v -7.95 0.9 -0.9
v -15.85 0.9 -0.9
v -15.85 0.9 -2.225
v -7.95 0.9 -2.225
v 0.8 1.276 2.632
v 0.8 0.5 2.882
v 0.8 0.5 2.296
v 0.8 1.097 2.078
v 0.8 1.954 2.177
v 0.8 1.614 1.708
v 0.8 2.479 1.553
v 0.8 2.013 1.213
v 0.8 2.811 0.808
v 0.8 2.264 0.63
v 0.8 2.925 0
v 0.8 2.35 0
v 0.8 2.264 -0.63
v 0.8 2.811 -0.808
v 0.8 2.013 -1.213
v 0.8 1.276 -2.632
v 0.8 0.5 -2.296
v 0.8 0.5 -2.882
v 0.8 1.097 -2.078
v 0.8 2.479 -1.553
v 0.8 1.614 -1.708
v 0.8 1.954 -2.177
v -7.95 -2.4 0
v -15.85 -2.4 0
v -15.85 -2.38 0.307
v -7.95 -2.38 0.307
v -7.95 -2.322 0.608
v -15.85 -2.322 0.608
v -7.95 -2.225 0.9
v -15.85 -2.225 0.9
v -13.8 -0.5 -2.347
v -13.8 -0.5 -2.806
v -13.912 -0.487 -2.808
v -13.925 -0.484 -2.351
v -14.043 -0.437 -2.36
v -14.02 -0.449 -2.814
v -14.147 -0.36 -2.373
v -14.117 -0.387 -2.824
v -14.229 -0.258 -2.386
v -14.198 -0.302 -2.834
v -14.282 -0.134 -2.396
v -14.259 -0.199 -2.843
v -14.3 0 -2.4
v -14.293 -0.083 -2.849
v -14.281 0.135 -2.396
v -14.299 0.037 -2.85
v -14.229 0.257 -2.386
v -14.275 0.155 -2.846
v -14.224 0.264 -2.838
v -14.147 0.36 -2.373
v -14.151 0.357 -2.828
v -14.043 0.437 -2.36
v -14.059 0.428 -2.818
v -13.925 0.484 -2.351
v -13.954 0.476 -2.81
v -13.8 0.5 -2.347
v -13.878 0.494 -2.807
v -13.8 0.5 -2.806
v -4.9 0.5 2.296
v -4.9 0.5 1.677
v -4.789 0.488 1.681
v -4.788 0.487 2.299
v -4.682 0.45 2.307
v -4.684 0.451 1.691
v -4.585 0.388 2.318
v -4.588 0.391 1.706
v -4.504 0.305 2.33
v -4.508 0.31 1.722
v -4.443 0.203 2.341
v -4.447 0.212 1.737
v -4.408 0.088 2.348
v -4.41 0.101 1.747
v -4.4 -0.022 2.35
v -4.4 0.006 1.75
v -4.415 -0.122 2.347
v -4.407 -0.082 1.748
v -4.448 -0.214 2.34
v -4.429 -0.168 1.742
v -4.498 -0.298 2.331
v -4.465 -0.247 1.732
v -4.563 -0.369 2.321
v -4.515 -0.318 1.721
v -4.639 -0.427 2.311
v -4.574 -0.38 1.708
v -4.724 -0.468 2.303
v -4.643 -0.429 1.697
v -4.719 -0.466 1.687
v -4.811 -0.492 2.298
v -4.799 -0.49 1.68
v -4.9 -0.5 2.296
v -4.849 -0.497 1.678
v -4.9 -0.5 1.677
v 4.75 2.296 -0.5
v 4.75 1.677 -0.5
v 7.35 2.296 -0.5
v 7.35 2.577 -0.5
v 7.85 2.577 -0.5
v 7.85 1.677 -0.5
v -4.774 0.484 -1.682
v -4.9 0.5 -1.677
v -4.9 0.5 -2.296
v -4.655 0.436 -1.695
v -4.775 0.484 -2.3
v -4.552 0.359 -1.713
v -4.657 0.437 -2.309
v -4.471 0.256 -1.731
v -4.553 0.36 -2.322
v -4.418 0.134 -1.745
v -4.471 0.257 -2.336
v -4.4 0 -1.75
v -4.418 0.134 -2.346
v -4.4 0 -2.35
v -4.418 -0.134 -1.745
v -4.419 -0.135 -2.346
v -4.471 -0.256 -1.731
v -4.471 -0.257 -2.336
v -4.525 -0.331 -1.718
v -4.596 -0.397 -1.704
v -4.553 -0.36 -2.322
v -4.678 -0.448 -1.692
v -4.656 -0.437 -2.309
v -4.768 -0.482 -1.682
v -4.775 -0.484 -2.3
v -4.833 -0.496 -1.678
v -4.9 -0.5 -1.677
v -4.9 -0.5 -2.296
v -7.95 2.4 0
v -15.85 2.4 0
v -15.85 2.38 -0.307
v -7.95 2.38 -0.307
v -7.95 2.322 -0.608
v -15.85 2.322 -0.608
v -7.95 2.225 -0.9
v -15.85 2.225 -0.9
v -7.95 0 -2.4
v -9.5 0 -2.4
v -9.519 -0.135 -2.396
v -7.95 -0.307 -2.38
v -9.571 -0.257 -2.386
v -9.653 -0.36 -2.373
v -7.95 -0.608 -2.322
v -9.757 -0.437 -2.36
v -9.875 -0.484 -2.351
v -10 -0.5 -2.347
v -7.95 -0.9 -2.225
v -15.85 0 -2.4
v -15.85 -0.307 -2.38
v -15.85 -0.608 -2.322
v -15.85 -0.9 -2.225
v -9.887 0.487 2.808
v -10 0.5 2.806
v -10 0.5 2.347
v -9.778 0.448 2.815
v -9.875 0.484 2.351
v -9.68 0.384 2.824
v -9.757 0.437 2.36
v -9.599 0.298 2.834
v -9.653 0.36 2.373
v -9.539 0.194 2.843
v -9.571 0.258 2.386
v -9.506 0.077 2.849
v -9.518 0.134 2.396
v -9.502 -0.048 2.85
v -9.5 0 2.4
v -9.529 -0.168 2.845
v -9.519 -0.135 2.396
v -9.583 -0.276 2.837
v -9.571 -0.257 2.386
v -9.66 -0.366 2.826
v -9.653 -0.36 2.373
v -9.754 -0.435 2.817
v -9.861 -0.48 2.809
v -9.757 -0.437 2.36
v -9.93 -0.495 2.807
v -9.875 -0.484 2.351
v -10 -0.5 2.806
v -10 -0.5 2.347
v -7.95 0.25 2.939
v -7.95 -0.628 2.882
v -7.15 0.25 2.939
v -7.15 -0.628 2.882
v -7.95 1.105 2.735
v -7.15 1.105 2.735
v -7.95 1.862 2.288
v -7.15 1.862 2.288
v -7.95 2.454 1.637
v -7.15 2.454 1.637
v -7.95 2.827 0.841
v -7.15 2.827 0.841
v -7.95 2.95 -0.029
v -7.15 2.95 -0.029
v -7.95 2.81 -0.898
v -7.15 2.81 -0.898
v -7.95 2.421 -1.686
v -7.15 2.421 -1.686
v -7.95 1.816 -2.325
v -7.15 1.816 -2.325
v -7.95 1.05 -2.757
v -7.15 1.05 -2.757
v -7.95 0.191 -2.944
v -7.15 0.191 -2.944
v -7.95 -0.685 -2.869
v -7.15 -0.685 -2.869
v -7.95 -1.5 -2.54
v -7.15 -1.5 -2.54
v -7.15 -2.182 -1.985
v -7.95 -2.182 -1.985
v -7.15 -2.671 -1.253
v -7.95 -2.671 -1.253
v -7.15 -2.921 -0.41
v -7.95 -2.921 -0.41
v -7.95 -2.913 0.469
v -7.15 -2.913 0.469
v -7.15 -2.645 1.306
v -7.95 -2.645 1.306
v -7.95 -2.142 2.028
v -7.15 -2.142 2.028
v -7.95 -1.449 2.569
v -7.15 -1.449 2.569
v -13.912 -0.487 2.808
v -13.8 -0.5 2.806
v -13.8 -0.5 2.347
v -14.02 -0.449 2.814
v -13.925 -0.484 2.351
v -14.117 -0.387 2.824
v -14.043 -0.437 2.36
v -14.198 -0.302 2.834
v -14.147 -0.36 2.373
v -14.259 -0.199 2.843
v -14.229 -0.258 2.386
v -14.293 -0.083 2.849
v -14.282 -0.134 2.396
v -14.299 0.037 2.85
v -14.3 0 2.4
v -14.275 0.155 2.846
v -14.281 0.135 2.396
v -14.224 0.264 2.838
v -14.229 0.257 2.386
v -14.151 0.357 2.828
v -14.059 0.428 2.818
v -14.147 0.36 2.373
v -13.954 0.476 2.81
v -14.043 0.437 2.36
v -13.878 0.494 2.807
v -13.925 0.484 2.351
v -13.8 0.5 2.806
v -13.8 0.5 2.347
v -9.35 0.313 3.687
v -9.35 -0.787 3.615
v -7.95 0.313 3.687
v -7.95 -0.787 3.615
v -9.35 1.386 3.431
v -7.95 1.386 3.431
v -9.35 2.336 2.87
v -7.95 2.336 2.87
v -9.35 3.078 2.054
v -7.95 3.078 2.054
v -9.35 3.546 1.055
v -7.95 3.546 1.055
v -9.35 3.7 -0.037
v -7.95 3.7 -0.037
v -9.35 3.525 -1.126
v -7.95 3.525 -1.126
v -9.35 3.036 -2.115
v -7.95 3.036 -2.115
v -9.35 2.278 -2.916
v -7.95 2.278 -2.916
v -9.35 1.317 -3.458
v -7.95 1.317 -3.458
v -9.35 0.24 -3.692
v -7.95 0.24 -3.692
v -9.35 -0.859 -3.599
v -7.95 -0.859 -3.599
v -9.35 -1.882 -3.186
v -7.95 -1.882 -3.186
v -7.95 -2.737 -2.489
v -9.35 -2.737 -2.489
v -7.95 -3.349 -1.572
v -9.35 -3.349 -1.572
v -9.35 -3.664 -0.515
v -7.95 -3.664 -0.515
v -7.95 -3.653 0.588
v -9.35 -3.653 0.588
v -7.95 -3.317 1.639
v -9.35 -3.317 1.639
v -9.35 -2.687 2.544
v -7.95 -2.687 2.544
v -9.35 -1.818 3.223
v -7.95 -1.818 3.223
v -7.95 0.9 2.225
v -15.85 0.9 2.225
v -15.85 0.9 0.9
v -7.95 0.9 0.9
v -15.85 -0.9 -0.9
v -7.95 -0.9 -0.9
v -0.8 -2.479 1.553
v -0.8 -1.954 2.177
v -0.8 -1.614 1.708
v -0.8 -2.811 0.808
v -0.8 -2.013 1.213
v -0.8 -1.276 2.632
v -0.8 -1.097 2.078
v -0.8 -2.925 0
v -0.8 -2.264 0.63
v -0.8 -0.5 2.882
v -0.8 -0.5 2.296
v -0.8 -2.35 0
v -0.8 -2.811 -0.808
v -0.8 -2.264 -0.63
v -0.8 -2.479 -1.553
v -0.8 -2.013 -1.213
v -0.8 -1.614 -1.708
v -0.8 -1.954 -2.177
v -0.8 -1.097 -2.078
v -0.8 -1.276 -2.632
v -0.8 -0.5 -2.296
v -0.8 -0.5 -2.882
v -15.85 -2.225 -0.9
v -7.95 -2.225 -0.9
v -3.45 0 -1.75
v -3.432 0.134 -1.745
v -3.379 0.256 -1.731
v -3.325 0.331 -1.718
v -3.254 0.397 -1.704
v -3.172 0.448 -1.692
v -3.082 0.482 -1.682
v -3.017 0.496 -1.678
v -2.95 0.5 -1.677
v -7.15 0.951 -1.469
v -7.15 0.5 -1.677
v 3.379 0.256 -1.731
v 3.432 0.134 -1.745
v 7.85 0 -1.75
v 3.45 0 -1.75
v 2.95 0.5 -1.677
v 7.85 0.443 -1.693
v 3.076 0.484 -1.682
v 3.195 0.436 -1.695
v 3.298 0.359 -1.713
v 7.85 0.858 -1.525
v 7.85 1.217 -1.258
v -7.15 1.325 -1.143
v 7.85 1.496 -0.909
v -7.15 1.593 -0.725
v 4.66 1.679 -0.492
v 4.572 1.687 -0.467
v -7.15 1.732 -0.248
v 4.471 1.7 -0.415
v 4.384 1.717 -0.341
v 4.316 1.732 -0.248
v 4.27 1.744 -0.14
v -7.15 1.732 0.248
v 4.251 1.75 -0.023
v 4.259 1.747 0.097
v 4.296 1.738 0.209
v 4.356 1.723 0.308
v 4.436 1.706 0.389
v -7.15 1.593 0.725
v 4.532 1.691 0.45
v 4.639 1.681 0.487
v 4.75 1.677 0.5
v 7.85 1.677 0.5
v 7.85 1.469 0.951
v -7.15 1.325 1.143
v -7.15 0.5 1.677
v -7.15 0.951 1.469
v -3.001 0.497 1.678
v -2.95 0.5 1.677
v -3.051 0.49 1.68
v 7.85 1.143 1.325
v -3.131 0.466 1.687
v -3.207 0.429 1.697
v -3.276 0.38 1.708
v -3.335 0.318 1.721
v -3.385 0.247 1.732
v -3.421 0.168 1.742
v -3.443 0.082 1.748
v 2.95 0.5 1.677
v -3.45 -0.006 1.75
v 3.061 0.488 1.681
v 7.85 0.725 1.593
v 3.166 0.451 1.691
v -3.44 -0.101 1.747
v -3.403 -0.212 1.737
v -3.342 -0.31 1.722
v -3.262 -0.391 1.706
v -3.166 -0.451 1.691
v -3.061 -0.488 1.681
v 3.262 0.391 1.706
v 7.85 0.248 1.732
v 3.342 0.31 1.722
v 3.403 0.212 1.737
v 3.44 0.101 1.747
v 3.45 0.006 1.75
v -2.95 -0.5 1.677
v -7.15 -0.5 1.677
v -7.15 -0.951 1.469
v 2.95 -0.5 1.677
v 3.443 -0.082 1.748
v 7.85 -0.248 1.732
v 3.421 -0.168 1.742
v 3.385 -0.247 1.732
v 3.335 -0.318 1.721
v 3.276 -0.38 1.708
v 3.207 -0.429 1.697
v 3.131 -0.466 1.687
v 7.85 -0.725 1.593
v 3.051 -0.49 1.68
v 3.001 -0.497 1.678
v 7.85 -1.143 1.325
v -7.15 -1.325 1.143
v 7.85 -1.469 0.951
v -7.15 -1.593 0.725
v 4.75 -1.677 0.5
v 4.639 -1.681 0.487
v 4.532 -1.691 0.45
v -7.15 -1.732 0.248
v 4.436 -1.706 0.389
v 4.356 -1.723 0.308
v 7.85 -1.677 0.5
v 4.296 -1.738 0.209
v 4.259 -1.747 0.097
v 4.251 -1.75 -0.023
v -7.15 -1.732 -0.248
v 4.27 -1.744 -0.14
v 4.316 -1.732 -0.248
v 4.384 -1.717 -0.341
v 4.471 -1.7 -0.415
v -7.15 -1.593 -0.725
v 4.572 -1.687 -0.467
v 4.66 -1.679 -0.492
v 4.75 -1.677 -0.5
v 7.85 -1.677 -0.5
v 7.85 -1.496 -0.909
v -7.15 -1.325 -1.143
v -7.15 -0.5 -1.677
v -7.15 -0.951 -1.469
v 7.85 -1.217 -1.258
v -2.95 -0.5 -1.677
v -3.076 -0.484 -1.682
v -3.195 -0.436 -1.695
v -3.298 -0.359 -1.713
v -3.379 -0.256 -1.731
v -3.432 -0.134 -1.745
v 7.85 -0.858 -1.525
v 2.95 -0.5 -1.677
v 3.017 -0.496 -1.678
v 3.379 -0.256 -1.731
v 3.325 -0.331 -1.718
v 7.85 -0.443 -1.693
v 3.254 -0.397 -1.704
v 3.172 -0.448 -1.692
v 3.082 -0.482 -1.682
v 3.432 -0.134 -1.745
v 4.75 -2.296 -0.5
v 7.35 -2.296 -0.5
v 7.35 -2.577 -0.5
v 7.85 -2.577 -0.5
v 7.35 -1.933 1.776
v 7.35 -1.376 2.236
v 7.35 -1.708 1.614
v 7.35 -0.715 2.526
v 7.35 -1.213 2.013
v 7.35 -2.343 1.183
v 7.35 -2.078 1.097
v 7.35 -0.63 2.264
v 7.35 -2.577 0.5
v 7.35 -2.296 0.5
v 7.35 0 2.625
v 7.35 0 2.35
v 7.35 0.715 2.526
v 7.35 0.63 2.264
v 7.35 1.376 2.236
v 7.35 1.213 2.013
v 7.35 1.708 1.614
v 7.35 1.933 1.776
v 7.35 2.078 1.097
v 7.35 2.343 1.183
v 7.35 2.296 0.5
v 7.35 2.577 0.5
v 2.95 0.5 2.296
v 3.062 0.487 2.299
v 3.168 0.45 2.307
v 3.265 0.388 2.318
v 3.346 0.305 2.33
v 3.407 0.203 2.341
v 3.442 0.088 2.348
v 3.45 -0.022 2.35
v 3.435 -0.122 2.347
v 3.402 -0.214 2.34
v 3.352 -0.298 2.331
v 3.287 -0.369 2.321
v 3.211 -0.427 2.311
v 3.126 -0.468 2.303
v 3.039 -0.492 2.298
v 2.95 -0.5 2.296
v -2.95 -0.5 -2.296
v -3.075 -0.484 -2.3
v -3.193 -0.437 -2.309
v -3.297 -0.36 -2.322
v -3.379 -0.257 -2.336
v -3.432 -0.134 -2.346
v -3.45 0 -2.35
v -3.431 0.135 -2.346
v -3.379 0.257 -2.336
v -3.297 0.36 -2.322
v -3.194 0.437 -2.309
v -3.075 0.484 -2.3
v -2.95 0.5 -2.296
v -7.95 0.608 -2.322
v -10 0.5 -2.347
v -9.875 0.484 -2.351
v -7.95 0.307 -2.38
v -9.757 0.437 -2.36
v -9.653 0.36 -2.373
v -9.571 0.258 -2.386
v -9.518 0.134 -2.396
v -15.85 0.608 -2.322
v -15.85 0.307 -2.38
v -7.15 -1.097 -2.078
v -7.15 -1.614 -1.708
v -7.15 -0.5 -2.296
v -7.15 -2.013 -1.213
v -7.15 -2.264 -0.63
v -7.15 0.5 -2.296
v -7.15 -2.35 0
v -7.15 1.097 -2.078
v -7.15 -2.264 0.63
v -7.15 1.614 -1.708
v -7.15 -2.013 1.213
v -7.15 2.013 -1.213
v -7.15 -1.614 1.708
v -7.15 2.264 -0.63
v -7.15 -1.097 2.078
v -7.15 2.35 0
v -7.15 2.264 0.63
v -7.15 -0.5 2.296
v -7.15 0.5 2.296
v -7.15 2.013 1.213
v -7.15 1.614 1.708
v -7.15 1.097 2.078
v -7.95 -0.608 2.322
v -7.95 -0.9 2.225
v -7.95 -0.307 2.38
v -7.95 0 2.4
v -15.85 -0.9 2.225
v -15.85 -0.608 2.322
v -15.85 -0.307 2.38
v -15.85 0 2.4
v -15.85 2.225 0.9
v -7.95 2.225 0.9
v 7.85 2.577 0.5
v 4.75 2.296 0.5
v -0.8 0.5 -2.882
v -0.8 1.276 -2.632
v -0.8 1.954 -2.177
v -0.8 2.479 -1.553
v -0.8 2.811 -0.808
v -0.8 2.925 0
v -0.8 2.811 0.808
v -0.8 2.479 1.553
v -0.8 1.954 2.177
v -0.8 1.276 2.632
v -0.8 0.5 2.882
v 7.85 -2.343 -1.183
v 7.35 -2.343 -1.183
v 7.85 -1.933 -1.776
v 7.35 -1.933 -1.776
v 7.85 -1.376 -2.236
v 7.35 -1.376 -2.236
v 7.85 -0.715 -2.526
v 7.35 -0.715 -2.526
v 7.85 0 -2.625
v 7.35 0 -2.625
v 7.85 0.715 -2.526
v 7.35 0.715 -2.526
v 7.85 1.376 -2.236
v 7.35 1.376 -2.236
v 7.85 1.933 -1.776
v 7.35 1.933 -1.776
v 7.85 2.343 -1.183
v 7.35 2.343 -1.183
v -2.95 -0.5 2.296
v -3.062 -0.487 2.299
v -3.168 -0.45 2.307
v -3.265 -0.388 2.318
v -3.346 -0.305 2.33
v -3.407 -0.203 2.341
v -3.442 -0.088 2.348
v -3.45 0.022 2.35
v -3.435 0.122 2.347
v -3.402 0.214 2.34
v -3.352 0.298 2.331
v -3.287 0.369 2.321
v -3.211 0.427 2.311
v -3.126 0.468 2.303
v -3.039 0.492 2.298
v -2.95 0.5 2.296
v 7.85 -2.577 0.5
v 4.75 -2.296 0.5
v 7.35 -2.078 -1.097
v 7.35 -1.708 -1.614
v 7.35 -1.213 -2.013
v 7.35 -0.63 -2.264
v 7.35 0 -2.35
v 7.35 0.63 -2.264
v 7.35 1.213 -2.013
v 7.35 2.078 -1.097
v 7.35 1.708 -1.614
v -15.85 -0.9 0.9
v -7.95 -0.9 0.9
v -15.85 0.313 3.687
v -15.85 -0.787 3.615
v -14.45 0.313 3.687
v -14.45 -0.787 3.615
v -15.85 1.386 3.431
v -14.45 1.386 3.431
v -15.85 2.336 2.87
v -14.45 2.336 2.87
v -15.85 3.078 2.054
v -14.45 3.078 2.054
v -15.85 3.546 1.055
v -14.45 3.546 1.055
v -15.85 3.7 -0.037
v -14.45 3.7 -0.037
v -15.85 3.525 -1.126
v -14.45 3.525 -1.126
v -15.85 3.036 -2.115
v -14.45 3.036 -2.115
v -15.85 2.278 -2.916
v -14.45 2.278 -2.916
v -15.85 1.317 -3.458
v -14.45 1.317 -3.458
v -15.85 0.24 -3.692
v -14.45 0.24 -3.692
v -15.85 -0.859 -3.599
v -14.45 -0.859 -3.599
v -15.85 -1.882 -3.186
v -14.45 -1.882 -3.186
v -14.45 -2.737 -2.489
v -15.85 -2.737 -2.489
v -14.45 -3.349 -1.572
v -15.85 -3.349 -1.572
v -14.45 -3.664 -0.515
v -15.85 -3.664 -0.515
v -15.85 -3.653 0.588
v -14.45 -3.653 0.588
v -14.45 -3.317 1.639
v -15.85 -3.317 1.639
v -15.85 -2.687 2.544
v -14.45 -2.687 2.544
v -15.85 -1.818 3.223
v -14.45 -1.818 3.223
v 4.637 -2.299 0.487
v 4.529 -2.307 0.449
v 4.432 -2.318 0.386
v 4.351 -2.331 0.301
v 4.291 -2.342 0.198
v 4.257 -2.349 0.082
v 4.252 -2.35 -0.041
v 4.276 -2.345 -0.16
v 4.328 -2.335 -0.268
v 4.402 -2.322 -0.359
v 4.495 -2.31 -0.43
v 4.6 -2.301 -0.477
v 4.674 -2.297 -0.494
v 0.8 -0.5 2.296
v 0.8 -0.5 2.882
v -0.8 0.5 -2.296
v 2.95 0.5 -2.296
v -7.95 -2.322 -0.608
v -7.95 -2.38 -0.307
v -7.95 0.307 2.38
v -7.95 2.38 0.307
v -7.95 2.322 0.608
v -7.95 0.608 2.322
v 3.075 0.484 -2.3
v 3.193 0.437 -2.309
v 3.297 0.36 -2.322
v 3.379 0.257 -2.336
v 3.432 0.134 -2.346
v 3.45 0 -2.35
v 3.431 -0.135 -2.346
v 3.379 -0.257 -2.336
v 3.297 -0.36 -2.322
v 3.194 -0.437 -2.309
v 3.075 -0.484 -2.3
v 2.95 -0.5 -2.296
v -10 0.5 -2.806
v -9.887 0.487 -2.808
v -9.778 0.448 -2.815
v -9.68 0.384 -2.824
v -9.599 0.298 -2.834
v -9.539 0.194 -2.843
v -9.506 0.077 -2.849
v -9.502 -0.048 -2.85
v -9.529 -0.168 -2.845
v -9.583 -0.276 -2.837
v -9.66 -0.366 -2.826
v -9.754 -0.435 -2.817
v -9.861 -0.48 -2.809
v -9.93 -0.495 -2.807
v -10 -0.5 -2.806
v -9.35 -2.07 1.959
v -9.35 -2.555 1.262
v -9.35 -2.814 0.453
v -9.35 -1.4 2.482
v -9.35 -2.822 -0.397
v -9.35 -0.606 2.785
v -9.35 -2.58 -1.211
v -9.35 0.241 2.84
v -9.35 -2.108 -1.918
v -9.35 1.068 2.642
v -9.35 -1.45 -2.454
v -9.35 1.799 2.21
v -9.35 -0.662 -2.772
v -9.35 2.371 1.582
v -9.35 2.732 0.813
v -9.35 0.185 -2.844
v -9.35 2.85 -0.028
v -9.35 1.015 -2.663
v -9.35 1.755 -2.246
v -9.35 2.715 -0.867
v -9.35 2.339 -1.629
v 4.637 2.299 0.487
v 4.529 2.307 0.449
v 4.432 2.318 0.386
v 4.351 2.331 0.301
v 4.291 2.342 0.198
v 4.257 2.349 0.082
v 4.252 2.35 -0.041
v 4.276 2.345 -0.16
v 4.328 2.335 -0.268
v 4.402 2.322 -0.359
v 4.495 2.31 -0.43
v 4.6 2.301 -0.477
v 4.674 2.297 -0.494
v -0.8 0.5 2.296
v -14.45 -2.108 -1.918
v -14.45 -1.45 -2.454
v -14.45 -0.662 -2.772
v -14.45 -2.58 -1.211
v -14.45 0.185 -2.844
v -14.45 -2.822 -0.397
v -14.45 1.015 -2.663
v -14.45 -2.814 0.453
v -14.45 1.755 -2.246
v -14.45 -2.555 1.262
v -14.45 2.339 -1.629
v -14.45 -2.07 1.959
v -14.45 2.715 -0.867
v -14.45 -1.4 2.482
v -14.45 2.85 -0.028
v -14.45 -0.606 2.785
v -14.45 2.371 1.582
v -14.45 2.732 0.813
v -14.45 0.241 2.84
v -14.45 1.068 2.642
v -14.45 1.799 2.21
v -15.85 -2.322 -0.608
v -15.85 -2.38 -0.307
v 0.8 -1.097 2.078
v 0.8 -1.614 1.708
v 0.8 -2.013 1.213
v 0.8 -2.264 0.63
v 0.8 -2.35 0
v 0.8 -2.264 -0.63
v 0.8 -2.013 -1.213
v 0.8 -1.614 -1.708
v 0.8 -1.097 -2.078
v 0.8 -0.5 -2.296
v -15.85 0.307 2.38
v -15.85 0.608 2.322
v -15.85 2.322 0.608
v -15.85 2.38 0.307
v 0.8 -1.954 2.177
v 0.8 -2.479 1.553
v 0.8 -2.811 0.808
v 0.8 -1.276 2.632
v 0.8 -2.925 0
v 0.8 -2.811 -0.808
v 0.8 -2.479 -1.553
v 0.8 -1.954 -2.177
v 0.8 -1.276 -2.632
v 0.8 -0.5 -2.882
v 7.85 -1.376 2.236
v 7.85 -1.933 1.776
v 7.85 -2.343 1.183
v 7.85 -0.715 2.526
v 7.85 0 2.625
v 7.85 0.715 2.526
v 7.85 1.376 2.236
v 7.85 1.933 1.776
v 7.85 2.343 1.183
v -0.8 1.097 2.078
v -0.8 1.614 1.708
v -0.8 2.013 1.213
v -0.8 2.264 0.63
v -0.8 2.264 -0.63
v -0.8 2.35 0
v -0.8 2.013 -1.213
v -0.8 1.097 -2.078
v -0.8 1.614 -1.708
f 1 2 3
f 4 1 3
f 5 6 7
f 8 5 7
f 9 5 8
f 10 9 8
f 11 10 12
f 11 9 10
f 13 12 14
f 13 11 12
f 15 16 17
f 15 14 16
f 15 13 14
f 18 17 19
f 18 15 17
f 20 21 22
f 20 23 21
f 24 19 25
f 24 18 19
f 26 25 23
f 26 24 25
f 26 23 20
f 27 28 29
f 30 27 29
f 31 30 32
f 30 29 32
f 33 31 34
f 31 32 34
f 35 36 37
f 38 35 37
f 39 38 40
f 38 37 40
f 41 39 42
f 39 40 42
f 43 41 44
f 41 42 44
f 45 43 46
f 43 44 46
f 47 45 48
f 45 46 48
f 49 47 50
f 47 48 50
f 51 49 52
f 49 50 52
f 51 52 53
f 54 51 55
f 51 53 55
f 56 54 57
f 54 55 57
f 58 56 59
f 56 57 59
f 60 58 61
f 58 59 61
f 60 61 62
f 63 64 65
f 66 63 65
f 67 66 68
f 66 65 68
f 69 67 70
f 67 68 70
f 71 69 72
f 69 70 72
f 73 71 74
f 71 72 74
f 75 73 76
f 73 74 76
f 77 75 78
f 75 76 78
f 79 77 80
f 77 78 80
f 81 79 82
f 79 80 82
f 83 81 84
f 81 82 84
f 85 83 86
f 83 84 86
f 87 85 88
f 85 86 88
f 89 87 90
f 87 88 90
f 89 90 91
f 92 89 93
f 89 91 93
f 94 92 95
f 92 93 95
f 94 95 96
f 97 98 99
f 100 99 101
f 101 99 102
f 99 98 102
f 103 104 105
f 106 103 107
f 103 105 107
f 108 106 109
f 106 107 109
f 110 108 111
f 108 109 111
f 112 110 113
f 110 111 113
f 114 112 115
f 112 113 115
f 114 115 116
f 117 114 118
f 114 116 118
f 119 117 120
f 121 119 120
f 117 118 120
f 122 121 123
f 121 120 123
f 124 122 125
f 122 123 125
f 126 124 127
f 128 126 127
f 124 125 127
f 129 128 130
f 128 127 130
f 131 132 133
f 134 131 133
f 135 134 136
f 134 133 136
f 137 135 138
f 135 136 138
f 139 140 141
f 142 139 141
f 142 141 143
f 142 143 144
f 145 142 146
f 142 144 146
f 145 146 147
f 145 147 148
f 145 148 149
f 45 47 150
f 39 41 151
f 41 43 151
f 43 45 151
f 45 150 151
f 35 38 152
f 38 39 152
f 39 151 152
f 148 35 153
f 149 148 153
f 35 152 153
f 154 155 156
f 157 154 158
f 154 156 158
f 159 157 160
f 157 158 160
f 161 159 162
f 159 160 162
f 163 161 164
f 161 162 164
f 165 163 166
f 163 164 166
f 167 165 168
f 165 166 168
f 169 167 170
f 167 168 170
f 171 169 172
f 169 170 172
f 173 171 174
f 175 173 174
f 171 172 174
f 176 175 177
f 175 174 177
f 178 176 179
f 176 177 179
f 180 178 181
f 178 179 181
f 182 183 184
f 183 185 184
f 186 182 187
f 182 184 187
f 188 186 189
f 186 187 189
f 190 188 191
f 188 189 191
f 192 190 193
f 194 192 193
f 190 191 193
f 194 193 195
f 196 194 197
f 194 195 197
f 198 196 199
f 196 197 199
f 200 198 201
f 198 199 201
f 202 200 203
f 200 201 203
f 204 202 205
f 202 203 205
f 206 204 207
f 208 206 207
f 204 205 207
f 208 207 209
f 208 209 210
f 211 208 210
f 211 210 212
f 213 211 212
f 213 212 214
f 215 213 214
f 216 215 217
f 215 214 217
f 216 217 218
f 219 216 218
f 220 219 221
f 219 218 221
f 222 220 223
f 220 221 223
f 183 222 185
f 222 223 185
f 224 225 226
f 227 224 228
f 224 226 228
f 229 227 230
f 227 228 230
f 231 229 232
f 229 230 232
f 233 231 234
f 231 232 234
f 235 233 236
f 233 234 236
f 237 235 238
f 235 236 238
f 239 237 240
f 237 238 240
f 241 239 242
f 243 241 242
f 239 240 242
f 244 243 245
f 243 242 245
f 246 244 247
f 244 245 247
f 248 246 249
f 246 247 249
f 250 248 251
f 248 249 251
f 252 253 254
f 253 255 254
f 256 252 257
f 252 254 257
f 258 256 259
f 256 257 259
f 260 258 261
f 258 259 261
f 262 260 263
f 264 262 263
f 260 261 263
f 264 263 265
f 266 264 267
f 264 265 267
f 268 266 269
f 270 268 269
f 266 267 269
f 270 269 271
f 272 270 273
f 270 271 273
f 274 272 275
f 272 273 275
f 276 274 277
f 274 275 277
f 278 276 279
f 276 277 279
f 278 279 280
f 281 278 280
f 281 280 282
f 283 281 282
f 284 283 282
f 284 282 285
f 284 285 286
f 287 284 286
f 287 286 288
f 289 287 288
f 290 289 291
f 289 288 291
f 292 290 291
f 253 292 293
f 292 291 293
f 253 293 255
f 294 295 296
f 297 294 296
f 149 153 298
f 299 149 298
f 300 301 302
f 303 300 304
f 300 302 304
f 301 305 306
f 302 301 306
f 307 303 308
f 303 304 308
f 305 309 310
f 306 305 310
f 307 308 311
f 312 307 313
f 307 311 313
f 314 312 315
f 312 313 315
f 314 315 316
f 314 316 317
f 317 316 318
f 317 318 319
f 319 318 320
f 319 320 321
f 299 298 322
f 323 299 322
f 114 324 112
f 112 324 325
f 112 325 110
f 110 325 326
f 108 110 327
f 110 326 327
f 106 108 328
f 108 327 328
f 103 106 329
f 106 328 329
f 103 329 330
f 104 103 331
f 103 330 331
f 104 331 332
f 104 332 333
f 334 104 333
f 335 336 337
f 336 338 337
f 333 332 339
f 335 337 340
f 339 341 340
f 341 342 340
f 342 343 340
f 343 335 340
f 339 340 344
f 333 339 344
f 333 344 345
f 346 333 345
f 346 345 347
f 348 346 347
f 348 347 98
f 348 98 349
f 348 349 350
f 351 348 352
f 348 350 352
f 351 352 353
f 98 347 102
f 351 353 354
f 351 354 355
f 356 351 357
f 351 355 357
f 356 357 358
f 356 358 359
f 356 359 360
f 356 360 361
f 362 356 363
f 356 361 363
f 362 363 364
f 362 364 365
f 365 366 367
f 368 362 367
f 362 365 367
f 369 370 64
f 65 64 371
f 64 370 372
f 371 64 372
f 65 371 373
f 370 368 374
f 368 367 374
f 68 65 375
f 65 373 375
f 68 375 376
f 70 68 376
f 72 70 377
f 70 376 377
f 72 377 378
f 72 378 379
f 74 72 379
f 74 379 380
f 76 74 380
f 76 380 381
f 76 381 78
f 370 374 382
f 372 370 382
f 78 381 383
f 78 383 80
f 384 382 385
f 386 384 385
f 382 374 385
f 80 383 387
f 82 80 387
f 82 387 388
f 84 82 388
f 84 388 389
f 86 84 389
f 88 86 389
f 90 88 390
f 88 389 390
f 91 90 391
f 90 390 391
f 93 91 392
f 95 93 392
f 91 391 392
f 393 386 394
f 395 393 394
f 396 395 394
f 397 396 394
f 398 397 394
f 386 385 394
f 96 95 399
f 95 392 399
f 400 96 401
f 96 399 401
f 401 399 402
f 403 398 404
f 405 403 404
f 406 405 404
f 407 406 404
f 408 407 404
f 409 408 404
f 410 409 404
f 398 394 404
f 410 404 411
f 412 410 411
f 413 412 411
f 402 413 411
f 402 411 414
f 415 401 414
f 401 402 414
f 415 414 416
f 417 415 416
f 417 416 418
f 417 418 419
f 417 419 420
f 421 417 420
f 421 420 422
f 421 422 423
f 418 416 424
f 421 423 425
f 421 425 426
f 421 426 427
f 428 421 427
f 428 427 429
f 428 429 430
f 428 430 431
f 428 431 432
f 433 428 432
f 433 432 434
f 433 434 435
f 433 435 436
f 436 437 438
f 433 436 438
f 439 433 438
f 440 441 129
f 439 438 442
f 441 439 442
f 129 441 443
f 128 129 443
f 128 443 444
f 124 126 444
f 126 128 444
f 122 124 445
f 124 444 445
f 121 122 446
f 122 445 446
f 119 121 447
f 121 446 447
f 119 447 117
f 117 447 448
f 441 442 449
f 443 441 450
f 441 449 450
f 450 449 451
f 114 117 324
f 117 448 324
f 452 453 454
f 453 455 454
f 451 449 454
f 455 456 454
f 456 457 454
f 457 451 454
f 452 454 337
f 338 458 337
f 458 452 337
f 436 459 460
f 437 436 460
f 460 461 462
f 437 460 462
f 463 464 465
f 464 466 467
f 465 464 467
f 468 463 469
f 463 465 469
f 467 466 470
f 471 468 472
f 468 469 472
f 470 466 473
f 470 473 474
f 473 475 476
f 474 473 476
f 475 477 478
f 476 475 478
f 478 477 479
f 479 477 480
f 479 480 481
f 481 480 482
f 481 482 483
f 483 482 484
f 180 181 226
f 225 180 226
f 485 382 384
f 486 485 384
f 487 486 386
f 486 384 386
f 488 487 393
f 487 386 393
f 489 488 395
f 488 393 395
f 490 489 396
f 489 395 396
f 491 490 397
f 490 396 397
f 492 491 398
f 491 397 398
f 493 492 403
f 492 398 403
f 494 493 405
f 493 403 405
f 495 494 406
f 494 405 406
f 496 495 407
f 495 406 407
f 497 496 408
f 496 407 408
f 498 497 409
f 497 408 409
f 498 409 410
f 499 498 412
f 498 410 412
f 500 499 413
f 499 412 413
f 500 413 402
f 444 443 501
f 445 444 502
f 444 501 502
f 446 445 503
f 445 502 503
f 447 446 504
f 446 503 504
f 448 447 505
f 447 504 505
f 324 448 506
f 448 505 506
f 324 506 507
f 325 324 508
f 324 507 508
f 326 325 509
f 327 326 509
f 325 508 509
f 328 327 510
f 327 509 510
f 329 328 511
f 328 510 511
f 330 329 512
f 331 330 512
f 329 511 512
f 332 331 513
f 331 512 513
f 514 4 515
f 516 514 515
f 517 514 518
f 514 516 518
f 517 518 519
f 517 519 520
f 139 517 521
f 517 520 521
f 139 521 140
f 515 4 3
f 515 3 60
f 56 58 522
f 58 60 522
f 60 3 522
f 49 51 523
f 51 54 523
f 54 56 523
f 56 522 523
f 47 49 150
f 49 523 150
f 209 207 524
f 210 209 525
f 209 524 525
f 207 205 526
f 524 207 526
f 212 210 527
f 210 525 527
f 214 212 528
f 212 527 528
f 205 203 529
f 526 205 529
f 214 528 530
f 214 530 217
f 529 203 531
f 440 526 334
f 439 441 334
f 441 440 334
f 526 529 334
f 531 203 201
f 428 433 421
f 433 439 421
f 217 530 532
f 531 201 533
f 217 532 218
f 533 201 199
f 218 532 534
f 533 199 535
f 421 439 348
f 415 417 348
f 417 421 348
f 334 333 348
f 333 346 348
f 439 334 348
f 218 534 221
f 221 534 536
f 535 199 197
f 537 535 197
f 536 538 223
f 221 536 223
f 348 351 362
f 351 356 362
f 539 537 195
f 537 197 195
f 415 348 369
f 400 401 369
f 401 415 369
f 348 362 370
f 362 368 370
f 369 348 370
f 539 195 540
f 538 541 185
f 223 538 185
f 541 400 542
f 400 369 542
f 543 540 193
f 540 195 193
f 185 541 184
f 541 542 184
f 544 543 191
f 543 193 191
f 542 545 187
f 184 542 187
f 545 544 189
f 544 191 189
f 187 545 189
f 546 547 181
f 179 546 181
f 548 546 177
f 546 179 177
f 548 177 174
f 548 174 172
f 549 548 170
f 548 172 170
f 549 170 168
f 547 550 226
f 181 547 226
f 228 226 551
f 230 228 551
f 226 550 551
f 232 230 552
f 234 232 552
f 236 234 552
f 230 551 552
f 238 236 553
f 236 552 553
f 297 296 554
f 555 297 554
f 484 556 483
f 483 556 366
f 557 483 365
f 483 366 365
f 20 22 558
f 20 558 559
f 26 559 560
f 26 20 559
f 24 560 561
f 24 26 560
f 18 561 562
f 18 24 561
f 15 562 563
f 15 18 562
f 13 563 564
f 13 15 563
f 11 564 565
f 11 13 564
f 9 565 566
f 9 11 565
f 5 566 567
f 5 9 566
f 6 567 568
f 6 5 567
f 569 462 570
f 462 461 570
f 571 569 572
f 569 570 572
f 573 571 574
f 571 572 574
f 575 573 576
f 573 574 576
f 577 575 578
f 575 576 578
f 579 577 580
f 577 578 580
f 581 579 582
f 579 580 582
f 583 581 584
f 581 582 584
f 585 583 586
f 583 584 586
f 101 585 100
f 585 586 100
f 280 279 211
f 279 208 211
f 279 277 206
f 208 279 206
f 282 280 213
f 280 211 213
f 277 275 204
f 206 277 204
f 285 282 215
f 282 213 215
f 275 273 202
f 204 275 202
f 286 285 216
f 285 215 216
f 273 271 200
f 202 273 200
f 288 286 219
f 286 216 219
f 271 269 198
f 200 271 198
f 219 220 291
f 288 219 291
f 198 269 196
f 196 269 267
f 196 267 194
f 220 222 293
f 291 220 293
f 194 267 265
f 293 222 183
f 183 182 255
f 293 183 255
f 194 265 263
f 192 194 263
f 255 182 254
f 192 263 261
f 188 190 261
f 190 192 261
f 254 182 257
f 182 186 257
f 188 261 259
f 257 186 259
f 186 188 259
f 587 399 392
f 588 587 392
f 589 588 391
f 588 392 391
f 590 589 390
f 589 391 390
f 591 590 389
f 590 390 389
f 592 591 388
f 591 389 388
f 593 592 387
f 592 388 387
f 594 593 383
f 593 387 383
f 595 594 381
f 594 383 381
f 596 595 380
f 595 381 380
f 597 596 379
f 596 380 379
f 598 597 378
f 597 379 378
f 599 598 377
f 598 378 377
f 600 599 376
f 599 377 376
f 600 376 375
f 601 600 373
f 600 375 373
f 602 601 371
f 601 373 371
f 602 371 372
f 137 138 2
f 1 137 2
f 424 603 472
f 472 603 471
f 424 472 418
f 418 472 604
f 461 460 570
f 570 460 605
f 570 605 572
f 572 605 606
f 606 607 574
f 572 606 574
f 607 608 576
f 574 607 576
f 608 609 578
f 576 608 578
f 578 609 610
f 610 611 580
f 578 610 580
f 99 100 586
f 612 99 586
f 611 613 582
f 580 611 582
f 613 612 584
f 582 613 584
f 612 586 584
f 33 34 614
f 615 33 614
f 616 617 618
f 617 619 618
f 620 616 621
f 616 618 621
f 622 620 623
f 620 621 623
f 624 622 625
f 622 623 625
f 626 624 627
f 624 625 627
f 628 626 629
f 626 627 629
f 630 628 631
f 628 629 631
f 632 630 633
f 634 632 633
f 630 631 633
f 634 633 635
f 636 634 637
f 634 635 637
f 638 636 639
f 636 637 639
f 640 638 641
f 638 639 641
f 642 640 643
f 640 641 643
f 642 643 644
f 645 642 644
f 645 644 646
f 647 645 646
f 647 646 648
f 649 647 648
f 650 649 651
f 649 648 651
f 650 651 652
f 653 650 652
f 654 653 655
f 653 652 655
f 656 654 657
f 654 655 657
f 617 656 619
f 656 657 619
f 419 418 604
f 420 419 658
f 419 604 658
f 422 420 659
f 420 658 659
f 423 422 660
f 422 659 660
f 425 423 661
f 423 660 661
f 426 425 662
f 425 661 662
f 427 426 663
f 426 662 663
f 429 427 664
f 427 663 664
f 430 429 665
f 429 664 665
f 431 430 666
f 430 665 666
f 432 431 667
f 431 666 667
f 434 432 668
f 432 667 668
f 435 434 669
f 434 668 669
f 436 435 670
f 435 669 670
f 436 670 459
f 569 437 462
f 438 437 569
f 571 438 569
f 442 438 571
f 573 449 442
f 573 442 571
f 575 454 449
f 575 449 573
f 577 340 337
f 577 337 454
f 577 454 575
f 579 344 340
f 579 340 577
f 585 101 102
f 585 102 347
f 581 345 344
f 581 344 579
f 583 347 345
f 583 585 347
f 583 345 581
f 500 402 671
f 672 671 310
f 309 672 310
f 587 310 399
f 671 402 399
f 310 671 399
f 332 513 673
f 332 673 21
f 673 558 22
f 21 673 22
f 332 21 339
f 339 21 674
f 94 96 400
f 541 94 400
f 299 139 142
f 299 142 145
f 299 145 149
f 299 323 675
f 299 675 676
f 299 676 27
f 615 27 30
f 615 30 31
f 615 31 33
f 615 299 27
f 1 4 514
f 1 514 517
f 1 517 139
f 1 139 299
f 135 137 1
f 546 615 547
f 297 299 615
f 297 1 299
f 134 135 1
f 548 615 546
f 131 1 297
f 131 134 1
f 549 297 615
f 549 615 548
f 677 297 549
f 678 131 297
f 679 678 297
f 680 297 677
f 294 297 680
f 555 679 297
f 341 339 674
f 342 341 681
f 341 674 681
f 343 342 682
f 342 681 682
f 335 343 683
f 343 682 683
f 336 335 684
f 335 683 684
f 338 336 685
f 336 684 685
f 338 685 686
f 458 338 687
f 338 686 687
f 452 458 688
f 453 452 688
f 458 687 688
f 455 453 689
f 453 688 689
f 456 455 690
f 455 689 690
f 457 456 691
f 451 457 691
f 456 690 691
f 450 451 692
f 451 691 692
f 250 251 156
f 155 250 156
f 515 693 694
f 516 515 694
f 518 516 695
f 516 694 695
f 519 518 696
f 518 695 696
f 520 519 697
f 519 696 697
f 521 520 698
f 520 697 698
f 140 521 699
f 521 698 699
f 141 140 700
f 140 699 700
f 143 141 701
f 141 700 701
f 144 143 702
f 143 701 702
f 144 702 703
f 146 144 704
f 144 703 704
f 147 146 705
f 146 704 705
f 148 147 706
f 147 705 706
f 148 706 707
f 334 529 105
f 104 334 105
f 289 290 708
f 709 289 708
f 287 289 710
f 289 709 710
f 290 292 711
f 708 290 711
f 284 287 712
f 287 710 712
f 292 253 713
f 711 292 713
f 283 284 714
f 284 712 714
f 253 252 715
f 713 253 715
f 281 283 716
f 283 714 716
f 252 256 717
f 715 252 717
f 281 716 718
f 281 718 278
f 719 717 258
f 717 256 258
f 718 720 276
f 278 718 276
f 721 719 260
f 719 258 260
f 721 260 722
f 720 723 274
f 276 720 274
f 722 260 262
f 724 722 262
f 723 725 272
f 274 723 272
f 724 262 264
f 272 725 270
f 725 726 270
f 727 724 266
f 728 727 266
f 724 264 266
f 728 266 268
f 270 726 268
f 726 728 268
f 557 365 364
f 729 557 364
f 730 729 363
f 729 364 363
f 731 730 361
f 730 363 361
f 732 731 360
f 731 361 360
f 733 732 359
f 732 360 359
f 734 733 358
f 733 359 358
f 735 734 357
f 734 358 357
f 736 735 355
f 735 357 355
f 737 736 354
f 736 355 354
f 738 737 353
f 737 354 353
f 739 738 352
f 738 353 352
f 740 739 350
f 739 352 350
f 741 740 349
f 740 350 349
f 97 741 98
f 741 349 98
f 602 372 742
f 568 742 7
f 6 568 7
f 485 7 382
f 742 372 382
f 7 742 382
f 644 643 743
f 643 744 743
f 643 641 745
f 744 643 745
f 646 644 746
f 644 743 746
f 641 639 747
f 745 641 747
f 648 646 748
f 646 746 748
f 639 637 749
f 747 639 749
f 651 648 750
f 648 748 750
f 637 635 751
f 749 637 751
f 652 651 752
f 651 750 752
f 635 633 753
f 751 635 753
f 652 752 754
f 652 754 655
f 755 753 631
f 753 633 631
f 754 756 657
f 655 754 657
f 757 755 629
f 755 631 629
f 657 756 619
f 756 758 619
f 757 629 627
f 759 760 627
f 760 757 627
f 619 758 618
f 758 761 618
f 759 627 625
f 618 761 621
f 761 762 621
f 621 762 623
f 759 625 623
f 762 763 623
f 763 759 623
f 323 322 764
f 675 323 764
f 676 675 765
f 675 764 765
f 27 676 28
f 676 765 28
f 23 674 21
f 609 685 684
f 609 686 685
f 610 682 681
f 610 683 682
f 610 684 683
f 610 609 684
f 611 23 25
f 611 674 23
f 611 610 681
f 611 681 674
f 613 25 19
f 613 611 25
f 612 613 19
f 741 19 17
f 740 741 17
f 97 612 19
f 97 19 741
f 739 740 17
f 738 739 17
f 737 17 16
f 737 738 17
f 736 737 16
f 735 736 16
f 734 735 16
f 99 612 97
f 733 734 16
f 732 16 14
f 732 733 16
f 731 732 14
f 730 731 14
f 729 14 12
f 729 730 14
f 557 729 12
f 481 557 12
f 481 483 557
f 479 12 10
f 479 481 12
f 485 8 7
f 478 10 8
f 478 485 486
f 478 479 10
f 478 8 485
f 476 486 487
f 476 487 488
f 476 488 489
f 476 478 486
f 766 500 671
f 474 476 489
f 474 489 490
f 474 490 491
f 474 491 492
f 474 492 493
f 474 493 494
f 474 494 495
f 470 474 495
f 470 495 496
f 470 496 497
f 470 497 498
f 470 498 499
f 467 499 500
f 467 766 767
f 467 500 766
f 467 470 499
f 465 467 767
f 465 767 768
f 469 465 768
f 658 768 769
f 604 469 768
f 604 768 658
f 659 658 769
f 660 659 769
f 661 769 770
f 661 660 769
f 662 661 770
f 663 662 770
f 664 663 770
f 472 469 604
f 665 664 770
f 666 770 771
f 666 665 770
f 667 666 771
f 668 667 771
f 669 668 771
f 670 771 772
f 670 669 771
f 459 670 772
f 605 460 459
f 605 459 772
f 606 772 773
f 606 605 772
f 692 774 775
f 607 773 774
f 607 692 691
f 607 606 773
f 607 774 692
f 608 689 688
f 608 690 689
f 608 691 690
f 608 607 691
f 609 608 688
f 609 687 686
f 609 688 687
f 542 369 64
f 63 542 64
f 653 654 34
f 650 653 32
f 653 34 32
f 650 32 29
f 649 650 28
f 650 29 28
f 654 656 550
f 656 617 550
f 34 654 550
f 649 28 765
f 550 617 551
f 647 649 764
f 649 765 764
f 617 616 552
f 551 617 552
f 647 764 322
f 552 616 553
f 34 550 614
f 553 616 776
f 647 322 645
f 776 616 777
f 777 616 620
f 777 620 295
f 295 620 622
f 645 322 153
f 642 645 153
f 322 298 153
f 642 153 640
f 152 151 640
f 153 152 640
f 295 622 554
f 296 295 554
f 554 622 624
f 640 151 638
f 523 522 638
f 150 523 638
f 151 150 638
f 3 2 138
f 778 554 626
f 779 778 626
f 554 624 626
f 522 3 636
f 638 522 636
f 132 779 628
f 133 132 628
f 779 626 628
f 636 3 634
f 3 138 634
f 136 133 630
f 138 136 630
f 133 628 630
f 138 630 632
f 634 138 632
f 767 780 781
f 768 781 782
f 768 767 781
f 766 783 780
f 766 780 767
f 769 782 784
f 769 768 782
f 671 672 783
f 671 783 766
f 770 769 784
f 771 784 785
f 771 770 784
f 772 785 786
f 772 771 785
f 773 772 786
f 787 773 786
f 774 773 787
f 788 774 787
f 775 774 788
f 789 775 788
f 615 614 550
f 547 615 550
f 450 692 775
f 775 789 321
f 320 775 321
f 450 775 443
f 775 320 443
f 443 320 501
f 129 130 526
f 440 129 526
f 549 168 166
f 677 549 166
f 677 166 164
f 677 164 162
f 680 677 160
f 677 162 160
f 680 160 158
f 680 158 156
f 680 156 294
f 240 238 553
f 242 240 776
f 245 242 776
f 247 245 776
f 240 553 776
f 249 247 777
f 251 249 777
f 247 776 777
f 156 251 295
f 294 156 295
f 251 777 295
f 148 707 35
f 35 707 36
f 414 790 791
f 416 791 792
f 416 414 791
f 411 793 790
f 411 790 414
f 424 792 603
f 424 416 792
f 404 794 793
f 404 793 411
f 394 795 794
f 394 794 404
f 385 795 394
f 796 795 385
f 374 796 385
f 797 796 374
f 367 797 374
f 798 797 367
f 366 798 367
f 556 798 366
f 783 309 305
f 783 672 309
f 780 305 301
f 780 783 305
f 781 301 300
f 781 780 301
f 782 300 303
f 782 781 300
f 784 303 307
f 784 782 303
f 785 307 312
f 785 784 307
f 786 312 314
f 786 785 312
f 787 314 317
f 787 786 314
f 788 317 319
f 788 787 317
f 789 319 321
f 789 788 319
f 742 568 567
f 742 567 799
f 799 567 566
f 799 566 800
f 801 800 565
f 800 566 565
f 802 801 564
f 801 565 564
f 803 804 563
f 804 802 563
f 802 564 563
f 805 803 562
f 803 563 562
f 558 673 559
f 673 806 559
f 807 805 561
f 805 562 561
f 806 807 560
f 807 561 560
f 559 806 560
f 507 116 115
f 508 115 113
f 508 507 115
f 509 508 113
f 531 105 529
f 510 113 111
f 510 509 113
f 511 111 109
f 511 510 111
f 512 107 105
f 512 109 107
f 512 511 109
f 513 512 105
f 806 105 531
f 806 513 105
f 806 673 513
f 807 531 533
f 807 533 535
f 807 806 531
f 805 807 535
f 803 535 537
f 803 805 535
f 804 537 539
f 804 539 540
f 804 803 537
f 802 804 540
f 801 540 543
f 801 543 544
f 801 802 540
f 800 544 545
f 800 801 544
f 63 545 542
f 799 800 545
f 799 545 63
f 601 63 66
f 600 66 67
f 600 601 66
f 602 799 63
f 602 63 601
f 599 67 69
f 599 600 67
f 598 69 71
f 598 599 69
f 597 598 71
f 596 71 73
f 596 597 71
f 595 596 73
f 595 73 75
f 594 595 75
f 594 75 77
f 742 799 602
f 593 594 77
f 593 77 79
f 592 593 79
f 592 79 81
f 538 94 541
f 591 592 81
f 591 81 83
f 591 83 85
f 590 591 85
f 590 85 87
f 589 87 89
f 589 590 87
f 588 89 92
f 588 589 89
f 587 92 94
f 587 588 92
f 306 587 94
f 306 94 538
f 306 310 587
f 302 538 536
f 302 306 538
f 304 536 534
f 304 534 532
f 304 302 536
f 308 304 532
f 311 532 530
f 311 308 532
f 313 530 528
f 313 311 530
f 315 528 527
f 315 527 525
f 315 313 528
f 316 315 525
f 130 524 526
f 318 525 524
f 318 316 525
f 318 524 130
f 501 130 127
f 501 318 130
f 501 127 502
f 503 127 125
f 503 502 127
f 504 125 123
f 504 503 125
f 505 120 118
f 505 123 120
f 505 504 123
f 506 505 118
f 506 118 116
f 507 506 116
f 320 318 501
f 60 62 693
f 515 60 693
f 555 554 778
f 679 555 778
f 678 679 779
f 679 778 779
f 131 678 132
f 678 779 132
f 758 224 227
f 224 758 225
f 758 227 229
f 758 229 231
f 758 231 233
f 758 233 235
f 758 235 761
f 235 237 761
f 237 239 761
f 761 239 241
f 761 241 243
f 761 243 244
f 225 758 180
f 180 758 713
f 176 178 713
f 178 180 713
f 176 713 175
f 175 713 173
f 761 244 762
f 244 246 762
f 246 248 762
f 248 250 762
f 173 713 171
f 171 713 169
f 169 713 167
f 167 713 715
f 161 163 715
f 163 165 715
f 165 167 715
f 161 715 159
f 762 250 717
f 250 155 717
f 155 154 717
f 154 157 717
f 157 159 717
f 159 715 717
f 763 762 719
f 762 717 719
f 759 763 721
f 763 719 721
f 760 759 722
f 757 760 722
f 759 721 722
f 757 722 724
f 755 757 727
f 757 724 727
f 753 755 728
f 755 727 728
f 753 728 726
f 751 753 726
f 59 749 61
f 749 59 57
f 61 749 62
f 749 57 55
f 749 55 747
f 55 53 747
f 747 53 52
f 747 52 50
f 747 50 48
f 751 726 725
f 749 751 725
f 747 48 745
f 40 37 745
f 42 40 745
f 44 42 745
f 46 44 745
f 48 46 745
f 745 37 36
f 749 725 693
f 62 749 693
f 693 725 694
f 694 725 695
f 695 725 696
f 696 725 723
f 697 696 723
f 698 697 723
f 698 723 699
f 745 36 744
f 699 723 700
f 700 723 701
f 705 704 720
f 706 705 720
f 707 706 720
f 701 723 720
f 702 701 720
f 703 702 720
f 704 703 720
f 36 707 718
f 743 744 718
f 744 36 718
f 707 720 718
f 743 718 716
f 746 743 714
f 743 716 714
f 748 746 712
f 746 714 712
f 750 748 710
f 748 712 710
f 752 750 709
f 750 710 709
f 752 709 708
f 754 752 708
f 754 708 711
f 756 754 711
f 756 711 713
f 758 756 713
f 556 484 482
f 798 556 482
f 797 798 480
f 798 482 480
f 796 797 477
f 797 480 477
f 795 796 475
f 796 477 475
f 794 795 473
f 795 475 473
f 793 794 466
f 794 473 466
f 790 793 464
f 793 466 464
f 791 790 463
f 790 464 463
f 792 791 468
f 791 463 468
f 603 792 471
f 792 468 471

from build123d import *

# Parameters (mm, degrees)
SKETCH1_R              = 2.925
SKETCH1_R_2            = 1.75
MIDDLE_RING_DEPTH      = 0.8
SKETCH2_R              = 2.35
SKETCH2_R_2            = 1.75
OUTER_BODY_DEPTH       = 7.35
SKETCH3_R              = 2.625
SKETCH3_R_2            = 1.75
OUTER_RIM_DEPTH        = 0.5
MIDDLE_SLOT_DEPTH      = 9.873204044
MIDDLE_SLOT_DEPTH_BACK = 9.873204044
SIDE_SLOTS_DEPTH       = 9.859105574
SIDE_SLOTS_DEPTH_BACK  = 9.859105574
SKETCH7_W              = 1.8
SKETCH7_H              = 1.8
AXLE_CUT_DEPTH         = 7.9
BUSH_SLOT_DEPTH        = 17.691389996
BUSH_SLOT_DEPTH_BACK   = 17.691389996


with BuildPart() as part:
    # Sketch1 → Middle Ring (new, symmetric)
    with BuildSketch(Plane(origin=(0, 0, 0), x_dir=(0, 0, -1), z_dir=(1, 0, 0))):
        Circle(SKETCH1_R)
        Circle(SKETCH1_R_2, mode=Mode.SUBTRACT)
    extrude(amount=MIDDLE_RING_DEPTH, both=True)

    # Sketch2 → Outer Body (add, symmetric)
    with BuildSketch(Plane(origin=(0, 0, 0), x_dir=(0, 0, -1), z_dir=(1, 0, 0))):
        Circle(SKETCH2_R)
        Circle(SKETCH2_R_2, mode=Mode.SUBTRACT)
    extrude(amount=OUTER_BODY_DEPTH, both=True)

    # Sketch3 → Outer Rim (add)
    with BuildSketch(Plane(origin=(7.35, 0, 0), x_dir=(0, 0, -1), z_dir=(1, 0, 0))):
        Circle(SKETCH3_R)
        Circle(SKETCH3_R_2, mode=Mode.SUBTRACT)
    outer_rim = extrude(amount=OUTER_RIM_DEPTH)

    # Mirror1: Outer Rim across plane
    add(outer_rim.mirror(Plane(origin=(0, 0, 0), x_dir=(0, 0, 1), z_dir=(1, 0, 0))))

    # Sketch4 → Middle Slot (cut, two sides: drawn at the far end of the back side and taken through both)
    with BuildSketch(Plane.XY.offset(-MIDDLE_SLOT_DEPTH_BACK)):
        with BuildLine():
            Line((2.95, -0.5), (-2.95, -0.5))
            ThreePointArc((-2.95, -0.5), (-3.45, 0), (-2.95, 0.5))
            Line((-2.95, 0.5), (2.95, 0.5))
            ThreePointArc((2.95, 0.5), (3.45, 0), (2.95, -0.5))
        make_face()
        with BuildLine():
            Line((-10.8, 0.5), (-4.9, 0.5))
            ThreePointArc((-4.9, 0.5), (-4.4, 0), (-4.9, -0.5))
            Line((-4.9, -0.5), (-10.8, -0.5))
            ThreePointArc((-10.8, -0.5), (-11.3, 0), (-10.8, 0.5))
        make_face()
    extrude(amount=MIDDLE_SLOT_DEPTH + MIDDLE_SLOT_DEPTH_BACK, mode=Mode.SUBTRACT)

    # Sketch5 → Side Slots (cut, two sides: drawn at the far end of the back side and taken through both)
    with BuildSketch(Plane(origin=(0, 0, 0), x_dir=(1, 0, 0), z_dir=(0, 1, 0)).offset(-SIDE_SLOTS_DEPTH_BACK)):
        with BuildLine():
            Line((10.95, -0.5), (4.75, -0.5))
            ThreePointArc((4.75, -0.5), (4.25, 0), (4.75, 0.5))
            Line((4.75, 0.5), (10.95, 0.5))
            ThreePointArc((10.95, 0.5), (11.45, 0), (10.95, -0.5))
        make_face()
    extrude(amount=SIDE_SLOTS_DEPTH + SIDE_SLOTS_DEPTH_BACK, mode=Mode.SUBTRACT)

    # Sketch6 → Large Bush (revolve)
    with BuildSketch(Plane.XY, mode=Mode.PRIVATE) as large_bush_sk:
        Polygon((-15.85, 0), (-15.85, 3.7), (-14.45, 3.7), (-14.45, 2.85), (-9.35, 2.85), (-9.35, 3.7), (-7.95, 3.7), (-7.95, 2.95), (-7.15, 2.95), (-7.15, 0), align=None)
    revolve(large_bush_sk.sketch.rotate(Axis((0, 0, 0), (-1, 0, 0)), 257.715539925), axis=Axis((0, 0, 0), (-1, 0, 0)))

    # Sketch7 → Axle Cut (cut)
    with BuildSketch(Plane.ZY.offset(15.85)):
        with BuildLine():
            Line((-0.9, 0.9), (0.9, 0.9))
            Line((0.9, 0.9), (0.9, 2.224859546))
            ThreePointArc((0.9, 2.224859546), (0.45844143, 2.355808026), (0, 2.4))
            ThreePointArc((0, 2.4), (-0.45844143, 2.355808026), (-0.9, 2.224859546))
            Line((-0.9, 2.224859546), (-0.9, 0.9))
        make_face()
        Rectangle(SKETCH7_W, SKETCH7_H)
        with BuildLine():
            Line((-2.224859546, -0.9), (-0.9, -0.9))
            Line((-0.9, -0.9), (-0.9, 0.9))
            Line((-0.9, 0.9), (-2.224859546, 0.9))
            ThreePointArc((-2.224859546, 0.9), (-2.355808026, 0.458441427), (-2.4, -5e-09))
            ThreePointArc((-2.4, -5e-09), (-2.355808026, -0.458441432), (-2.224859546, -0.9))
        make_face()
        with BuildLine():
            Line((0.9, 0.9), (0.9, -0.9))
            Line((0.9, -0.9), (2.224859546, -0.9))
            ThreePointArc((2.224859546, -0.9), (2.355808026, -0.45844143), (2.4, 0))
            ThreePointArc((2.4, 0), (2.355808026, 0.45844143), (2.224859546, 0.9))
            Line((2.224859546, 0.9), (0.9, 0.9))
        make_face()
        with BuildLine():
            ThreePointArc((-0.9, -2.224859546), (-0.45844143, -2.355808026), (0, -2.4))
            ThreePointArc((0, -2.4), (0.45844143, -2.355808026), (0.9, -2.224859546))
            Line((0.9, -2.224859546), (0.9, -0.9))
            Line((0.9, -0.9), (-0.9, -0.9))
            Line((-0.9, -0.9), (-0.9, -2.224859546))
        make_face()
    extrude(amount=-AXLE_CUT_DEPTH, mode=Mode.SUBTRACT)

    # Sketch9 → Bush Slot (cut, two sides: drawn at the far end of the back side and taken through both)
    with BuildSketch(Plane.XY.offset(-BUSH_SLOT_DEPTH_BACK)):
        with BuildLine():
            Line((-13.8, 0.5), (-10, 0.5))
            ThreePointArc((-10, 0.5), (-9.5, 0), (-10, -0.5))
            Line((-10, -0.5), (-13.8, -0.5))
            ThreePointArc((-13.8, -0.5), (-14.3, 0), (-13.8, 0.5))
        make_face()
    extrude(amount=BUSH_SLOT_DEPTH + BUSH_SLOT_DEPTH_BACK, mode=Mode.SUBTRACT)


solid = part.part
